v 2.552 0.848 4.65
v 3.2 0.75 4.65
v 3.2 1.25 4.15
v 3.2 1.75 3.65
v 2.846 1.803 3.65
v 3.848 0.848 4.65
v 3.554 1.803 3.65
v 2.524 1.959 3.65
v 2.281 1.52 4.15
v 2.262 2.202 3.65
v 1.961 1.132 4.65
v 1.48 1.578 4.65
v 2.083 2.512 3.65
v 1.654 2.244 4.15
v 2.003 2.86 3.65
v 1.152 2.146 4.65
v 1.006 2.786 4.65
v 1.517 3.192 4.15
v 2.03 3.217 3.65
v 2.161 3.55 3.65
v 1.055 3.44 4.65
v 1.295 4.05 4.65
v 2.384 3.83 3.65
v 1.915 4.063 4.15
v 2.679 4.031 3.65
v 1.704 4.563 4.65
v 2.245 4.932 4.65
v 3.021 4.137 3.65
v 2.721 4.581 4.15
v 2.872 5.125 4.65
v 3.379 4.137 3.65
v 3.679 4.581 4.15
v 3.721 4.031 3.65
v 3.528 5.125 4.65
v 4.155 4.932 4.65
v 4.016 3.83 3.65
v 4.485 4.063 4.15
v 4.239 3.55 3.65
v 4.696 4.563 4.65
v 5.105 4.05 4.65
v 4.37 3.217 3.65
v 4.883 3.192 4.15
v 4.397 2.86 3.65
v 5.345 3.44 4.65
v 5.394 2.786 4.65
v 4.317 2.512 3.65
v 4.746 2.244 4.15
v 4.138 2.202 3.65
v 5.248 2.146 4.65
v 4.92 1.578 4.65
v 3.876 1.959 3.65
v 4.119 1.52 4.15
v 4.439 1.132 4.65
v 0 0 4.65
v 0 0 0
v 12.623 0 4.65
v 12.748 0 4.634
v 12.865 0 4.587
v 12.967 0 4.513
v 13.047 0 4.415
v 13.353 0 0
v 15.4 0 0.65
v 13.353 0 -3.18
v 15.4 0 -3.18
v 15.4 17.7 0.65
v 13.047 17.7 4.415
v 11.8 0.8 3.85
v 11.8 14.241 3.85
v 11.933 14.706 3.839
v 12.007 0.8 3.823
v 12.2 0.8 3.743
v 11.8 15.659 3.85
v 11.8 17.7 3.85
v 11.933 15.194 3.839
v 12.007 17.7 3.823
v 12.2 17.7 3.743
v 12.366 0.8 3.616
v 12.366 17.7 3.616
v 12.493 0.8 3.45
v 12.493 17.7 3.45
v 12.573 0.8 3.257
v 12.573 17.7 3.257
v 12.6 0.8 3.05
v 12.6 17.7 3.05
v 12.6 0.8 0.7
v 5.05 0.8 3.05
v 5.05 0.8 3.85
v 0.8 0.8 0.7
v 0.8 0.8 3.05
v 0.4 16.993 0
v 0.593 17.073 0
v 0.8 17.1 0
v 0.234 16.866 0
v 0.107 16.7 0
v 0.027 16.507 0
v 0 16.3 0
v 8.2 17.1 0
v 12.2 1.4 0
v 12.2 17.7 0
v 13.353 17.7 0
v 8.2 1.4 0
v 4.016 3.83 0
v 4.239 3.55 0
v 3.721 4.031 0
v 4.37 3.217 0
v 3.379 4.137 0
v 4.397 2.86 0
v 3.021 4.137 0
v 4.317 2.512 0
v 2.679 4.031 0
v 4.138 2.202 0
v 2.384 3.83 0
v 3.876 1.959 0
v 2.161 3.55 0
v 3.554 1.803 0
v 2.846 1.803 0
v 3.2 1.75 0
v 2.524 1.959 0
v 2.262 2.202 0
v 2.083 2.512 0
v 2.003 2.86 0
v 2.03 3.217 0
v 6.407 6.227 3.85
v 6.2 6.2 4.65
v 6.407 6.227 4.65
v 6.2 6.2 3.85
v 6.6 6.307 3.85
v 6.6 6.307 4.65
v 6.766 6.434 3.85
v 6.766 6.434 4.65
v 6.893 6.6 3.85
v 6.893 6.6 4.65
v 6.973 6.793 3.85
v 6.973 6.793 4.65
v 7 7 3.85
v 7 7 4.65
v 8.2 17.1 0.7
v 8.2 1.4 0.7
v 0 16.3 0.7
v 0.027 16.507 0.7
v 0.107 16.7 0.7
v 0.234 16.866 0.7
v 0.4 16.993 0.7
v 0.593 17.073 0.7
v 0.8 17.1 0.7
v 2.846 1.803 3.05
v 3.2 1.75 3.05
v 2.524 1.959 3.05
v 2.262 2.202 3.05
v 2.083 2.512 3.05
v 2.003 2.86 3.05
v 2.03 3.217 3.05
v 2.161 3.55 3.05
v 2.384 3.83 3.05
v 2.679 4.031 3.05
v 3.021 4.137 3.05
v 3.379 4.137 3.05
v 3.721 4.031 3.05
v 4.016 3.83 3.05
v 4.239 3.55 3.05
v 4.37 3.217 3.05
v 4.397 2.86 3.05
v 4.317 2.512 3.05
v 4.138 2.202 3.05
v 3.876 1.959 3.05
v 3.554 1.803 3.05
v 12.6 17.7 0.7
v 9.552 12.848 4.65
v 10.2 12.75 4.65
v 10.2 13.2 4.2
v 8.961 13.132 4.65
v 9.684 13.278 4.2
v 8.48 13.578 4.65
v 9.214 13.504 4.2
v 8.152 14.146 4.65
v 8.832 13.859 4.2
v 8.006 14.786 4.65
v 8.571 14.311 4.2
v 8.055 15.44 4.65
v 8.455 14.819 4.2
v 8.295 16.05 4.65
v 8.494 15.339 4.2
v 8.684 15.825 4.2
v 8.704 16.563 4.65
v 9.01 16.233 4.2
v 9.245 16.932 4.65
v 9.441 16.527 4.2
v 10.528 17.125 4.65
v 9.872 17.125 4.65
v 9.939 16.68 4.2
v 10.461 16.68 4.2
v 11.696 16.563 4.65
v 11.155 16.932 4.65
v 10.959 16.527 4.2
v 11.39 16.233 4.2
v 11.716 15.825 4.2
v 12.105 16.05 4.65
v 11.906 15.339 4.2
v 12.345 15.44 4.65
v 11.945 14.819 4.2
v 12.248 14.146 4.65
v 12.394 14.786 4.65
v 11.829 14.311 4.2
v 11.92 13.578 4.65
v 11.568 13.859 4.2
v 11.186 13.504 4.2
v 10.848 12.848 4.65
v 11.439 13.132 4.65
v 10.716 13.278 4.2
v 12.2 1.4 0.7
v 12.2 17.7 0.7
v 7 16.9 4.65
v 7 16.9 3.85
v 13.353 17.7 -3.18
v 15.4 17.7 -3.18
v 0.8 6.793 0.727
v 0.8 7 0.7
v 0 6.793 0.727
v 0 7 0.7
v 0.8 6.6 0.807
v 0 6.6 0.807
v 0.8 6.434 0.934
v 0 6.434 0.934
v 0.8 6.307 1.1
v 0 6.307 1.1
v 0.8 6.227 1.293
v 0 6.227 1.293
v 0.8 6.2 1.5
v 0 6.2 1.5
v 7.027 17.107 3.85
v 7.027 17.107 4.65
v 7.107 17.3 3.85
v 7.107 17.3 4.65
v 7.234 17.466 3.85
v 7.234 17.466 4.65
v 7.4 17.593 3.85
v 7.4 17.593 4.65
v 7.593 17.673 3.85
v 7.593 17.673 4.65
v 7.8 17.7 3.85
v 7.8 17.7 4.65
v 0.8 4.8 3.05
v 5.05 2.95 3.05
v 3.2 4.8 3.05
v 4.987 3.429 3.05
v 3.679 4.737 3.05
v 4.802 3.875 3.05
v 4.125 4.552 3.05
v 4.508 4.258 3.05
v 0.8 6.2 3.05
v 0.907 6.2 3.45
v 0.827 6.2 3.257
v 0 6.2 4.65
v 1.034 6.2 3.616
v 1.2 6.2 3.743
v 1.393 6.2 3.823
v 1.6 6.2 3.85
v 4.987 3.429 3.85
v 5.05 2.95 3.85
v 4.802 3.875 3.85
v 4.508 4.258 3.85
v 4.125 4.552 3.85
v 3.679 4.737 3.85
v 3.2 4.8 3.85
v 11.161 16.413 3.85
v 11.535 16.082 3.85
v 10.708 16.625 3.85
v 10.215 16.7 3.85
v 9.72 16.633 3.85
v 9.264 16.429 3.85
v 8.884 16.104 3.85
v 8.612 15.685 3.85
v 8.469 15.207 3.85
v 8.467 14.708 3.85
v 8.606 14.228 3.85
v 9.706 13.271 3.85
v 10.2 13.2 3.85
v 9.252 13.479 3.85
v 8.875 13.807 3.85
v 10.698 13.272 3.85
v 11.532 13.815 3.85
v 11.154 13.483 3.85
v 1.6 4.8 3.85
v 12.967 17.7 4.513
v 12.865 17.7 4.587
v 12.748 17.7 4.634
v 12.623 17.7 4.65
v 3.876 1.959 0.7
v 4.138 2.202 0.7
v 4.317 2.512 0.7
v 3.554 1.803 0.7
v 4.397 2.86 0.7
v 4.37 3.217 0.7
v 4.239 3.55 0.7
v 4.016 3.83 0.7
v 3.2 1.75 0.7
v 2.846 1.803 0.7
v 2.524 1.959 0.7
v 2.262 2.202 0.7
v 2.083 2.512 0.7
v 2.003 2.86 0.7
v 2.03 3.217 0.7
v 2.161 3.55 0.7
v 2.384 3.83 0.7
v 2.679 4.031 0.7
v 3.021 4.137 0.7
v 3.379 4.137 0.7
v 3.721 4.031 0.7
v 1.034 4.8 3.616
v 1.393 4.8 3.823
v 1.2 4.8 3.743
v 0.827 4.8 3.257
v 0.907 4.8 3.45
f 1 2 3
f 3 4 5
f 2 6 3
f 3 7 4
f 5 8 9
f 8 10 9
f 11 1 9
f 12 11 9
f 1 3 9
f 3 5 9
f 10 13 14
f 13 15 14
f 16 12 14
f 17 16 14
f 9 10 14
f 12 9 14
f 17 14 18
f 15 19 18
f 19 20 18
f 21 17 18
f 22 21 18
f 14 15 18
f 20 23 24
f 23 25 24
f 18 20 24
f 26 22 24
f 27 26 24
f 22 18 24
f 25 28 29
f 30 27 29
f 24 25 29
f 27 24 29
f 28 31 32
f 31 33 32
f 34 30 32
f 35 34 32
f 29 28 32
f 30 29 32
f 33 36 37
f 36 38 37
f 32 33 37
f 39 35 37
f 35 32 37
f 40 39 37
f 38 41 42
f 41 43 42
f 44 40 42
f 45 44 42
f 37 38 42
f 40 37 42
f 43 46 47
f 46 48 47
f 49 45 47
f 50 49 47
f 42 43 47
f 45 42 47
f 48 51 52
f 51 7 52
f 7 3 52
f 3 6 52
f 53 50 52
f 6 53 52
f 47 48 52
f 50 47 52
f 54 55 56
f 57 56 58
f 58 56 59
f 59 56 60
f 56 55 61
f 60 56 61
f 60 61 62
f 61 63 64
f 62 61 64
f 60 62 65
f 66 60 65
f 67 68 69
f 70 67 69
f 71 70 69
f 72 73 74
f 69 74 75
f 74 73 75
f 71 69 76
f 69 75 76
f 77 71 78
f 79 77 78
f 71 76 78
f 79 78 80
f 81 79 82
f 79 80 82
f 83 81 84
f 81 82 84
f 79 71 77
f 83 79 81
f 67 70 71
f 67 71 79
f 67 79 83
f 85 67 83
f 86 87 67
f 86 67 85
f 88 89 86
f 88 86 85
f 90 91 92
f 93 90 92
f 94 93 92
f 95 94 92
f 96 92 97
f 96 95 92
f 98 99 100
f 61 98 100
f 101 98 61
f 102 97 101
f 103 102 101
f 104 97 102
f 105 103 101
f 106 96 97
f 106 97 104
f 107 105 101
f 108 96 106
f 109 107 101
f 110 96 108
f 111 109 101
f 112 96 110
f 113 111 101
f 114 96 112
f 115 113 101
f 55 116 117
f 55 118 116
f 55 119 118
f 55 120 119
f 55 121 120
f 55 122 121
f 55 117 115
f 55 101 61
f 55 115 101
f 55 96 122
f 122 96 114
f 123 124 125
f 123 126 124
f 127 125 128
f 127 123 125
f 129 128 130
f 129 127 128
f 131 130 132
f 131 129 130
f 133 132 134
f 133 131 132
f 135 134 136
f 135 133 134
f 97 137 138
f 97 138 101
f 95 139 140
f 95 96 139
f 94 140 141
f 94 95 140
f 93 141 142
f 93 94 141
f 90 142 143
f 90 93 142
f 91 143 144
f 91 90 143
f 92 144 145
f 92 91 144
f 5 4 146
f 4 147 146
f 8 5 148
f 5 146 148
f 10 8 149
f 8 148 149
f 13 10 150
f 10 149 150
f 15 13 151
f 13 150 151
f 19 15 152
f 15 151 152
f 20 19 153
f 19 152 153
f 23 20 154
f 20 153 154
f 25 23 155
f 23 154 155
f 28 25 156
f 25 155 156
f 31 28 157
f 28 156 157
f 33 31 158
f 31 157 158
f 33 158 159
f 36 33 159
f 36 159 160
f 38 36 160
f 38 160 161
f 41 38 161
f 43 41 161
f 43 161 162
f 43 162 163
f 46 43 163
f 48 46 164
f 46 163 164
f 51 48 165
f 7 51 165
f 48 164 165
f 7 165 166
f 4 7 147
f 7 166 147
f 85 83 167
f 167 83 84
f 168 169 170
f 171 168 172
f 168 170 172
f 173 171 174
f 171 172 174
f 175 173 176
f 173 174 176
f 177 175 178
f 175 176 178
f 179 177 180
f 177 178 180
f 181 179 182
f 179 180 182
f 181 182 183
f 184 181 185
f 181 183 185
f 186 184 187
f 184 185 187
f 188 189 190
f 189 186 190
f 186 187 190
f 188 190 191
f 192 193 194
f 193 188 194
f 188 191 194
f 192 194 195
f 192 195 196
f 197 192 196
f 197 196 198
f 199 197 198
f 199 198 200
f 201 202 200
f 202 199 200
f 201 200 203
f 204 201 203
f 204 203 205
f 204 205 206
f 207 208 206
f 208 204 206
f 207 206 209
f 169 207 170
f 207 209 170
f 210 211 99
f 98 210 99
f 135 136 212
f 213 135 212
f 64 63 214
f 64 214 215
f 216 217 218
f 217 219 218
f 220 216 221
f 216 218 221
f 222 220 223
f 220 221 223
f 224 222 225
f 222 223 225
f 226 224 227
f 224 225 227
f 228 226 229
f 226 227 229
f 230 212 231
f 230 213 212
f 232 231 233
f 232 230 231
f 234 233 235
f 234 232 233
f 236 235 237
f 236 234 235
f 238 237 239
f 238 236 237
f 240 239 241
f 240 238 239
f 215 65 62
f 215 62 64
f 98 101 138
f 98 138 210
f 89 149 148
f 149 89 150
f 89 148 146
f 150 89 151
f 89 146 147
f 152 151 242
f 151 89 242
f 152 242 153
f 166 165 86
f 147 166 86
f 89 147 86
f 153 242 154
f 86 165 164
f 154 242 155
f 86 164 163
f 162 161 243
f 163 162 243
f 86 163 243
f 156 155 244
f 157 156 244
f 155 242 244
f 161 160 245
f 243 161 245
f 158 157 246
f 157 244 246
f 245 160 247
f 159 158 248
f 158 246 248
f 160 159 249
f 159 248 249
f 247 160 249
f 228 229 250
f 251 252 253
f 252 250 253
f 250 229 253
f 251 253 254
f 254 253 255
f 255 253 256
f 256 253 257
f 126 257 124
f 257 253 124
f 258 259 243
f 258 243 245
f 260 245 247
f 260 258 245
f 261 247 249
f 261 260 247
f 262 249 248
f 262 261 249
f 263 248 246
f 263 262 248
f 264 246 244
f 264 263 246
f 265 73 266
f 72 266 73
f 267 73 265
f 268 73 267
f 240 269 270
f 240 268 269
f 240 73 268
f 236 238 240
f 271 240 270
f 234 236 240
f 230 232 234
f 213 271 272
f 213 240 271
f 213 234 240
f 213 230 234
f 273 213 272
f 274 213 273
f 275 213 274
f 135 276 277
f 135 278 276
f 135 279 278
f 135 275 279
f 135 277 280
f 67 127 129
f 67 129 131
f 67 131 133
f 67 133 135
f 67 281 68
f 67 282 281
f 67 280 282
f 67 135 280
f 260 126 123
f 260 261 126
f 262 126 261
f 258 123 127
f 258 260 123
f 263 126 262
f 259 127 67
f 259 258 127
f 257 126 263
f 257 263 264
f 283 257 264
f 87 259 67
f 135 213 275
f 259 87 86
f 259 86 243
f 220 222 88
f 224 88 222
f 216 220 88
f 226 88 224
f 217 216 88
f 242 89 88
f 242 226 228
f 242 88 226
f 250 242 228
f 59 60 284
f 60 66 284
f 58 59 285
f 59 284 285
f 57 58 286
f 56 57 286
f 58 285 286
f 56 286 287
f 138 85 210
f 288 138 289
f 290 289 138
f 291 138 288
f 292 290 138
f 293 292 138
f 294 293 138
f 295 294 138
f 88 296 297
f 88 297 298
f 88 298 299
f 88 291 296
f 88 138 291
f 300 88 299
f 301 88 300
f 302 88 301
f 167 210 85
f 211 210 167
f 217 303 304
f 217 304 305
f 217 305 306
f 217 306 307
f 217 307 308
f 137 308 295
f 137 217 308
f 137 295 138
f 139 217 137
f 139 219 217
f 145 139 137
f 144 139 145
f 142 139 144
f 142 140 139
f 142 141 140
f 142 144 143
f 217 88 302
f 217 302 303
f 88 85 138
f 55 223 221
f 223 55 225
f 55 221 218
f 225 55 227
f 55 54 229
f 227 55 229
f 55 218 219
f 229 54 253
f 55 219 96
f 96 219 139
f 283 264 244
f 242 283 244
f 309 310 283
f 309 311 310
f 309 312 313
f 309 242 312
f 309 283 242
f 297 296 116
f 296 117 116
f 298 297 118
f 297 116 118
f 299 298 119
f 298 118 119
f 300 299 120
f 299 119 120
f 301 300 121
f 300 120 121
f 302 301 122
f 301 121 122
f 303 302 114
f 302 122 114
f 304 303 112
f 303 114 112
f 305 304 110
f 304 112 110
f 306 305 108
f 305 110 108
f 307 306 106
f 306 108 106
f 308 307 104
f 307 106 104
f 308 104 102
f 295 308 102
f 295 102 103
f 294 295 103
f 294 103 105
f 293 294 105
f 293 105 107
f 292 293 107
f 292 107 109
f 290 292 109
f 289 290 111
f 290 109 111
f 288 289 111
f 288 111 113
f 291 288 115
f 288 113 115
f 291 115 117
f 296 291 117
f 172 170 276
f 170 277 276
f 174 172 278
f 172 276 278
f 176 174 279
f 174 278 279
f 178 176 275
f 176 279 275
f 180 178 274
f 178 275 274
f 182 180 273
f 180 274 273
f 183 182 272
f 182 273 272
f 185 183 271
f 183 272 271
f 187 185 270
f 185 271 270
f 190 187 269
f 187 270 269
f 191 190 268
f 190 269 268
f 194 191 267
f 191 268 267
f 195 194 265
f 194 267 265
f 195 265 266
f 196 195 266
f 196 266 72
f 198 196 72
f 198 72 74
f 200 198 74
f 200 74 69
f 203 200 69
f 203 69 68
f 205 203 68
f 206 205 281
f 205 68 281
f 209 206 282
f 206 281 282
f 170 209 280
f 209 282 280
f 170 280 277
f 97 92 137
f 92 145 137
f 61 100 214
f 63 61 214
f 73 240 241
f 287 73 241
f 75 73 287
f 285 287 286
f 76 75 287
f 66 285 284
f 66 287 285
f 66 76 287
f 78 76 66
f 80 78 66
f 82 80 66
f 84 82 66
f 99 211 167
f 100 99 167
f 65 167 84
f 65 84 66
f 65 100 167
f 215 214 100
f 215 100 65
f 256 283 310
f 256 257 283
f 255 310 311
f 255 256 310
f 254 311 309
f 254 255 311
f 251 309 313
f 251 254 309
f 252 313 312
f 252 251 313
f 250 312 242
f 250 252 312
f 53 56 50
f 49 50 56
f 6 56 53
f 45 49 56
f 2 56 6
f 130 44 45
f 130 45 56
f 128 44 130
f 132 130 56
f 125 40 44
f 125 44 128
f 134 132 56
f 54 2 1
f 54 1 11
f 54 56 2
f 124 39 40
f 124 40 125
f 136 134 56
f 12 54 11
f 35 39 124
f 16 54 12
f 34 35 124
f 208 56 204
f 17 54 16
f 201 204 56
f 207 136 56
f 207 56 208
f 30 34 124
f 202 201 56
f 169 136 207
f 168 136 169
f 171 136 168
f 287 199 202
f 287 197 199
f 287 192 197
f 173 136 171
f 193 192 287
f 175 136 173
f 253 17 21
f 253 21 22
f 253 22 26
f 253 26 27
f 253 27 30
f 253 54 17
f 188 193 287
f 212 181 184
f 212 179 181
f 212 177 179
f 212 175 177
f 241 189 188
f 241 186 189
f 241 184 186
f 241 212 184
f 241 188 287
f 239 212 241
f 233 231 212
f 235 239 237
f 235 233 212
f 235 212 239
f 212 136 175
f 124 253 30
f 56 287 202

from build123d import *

# Parameters (mm, degrees)
BOSS_EXTRUDE1_DEPTH                             = 15.4
CUT_EXTRUDE2_REACH                              = 25.918
SKETCH3_W                                       = 7
SKETCH3_H                                       = 11.5
BOSS_EXTRUDE3_REACH                             = 25.918
SKETCH4_W                                       = 0.8
SKETCH4_H                                       = 6.2
SKETCH4_W_2                                     = 2.8
SKETCH4_H_2                                     = 17.7
SKETCH10_W                                      = 4
SKETCH10_H                                      = 0.7
CUT_EXTRUDE4_DEPTH                              = 16.3
BOSS_EXTRUDE4_DEPTH                             = 0.8
CSK_FOR_M2_FLAT_HEAD_MACHINE_SCREW3_D           = 2.4
CSK_FOR_M2_FLAT_HEAD_MACHINE_SCREW3_CSINK_D     = 4.4
CSK_FOR_M2_FLAT_HEAD_MACHINE_SCREW3_CSINK_ANGLE = 90
MOVE_FACE1_BY                                   = 0.6
FILLET3_R                                       = 0.8
CHAMFER1_SIZE                                   = 2.5
CHAMFER1_SIZE2                                  = 4
SKETCH12_W                                      = 2.0475
SKETCH12_H                                      = 3.18
BOSS_EXTRUDE5_DEPTH                             = 17.7
FILLET5_R                                       = 0.5
SKETCH11_R                                      = 1.75
CUT_EXTRUDE5_DEPTH                              = 25.492262043
CUT_EXTRUDE5_DIRECTION_2_REACH                  = 26.492


with BuildPart() as part:
    # Sketch2 → Boss-Extrude1 (new body)
    with BuildSketch(Plane(origin=(0, 0, 0), x_dir=(0, 0, -1), z_dir=(1, 0, 0))):
        Polygon((0, 0), (-4.65, 0), (-4.65, 17.7), (-3.85, 17.7), (-3.85, 0.8), (-0.7, 0.8), (-0.7, 17.7), (0, 17.7), align=None)
    extrude(amount=BOSS_EXTRUDE1_DEPTH)

    # Sketch3 → Cut-Extrude2 (cut, up to next)
    with BuildSketch(Plane.XY.offset(4.65), mode=Mode.PRIVATE) as cut_extrude2_sk1:
        with Locations((3.5, 11.95)):
            Rectangle(SKETCH3_W, SKETCH3_H)
    cut_extrude2_tool1 = extrude(cut_extrude2_sk1.sketch, amount=-CUT_EXTRUDE2_REACH, mode=Mode.PRIVATE) & part.part
    add(cut_extrude2_tool1.solids().sort_by_distance((3.5, 11.95, 4.65))[0], mode=Mode.SUBTRACT)

    # Sketch4 → Boss-Extrude3 (add, up to next)
    with BuildSketch(Plane.XY.offset(4.65), mode=Mode.PRIVATE) as boss_extrude3_sk1:
        with Locations((0.4, 3.1)):
            Rectangle(SKETCH4_W, SKETCH4_H)
    boss_extrude3_tool1 = extrude(boss_extrude3_sk1.sketch, amount=-BOSS_EXTRUDE3_REACH, mode=Mode.PRIVATE) - part.part
    # Sketch4 → Boss-Extrude3 (add, up to next)
    with BuildSketch(Plane.XY.offset(4.65), mode=Mode.PRIVATE) as boss_extrude3_sk2:
        with Locations((14, 8.85)):
            Rectangle(SKETCH4_W_2, SKETCH4_H_2)
    boss_extrude3_tool2 = extrude(boss_extrude3_sk2.sketch, amount=-BOSS_EXTRUDE3_REACH, mode=Mode.PRIVATE) - part.part
    add(boss_extrude3_tool1.solids().sort_by_distance((0.4, 3.1, 4.65))[0])
    add(boss_extrude3_tool2.solids().sort_by_distance((14, 8.85, 4.65))[0])

    # Sketch10 → Cut-Extrude4 (cut)
    with BuildSketch(Plane(origin=(0, 17.7, 0), x_dir=(1, 0, 0), z_dir=(0, 1, 0))):
        with Locations((10.2, -0.35)):
            Rectangle(SKETCH10_W, SKETCH10_H)
    extrude(amount=-CUT_EXTRUDE4_DEPTH, mode=Mode.SUBTRACT)

    # Sketch6 → Boss-Extrude4 (add)
    with BuildSketch(Plane(origin=(0, 0, 3.85), x_dir=(-1, 0, 0), z_dir=(0, 0, -1))):
        with BuildLine():
            Line((-0.8, 0.8), (-5.05, 0.8))
            Line((-5.05, 0.8), (-5.05, 2.95))
            ThreePointArc((-5.05, 2.95), (-4.508147545, 4.258147545), (-3.2, 4.8))
            Line((-3.2, 4.8), (-0.8, 4.8))
            Line((-0.8, 4.8), (-0.8, 0.8))
        make_face()
    extrude(amount=BOSS_EXTRUDE4_DEPTH)

    # CSK for M2 Flat Head Machine Screw3 (through all)
    with Locations(Plane(origin=(10.2, 14.95, 4.65), x_dir=(0, 1, 0), z_dir=(0, 0, 1))):
        with Locations((0, 0), (-12, 7)):
            CounterSinkHole(CSK_FOR_M2_FLAT_HEAD_MACHINE_SCREW3_D / 2, CSK_FOR_M2_FLAT_HEAD_MACHINE_SCREW3_CSINK_D / 2, counter_sink_angle=CSK_FOR_M2_FLAT_HEAD_MACHINE_SCREW3_CSINK_ANGLE)

    # Move Face1: a face moved inward by 0.6
    extrude(part.faces().sort_by_distance((4.1, 17.7, 0.35))[0], amount=MOVE_FACE1_BY, dir=(0, -1, 0), mode=Mode.SUBTRACT)

    # Fillet3
    fillet3_edges = [part.edges().sort_by_distance(p)[0] for p in [
        (0.8, 5.5, 3.85),
        (12.6, 9.25, 3.85),
        (0.4, 6.2, 0.7),
        (7, 6.2, 4.25),
        (7, 17.7, 4.25),
        (0, 17.1, 0.35),
    ]]
    fillet(fillet3_edges, radius=FILLET3_R)

    # Chamfer1
    chamfer1_edges = [part.edges().sort_by_distance(p)[0] for p in [
        (15.4, 8.85, 4.65),
    ]]
    chamfer1_side = [part.faces().sort_by_distance(p)[0] for p in [
        (9.979105197, 7.278141181, 4.65),
    ]]
    chamfer(chamfer1_edges, length=CHAMFER1_SIZE, length2=CHAMFER1_SIZE2, reference=chamfer1_side[0])

    # Sketch12 → Boss-Extrude5 (add)
    with BuildSketch(Plane(origin=(0, 17.7, 0), x_dir=(1, 0, 0), z_dir=(0, 1, 0))):
        with Locations((14.37625, 1.59)):
            Rectangle(SKETCH12_W, SKETCH12_H)
    extrude(amount=-BOSS_EXTRUDE5_DEPTH)

    # Fillet5
    fillet5_edges = [part.edges().sort_by_distance(p)[0] for p in [
        (12.9, 8.85, 4.65),
    ]]
    fillet(fillet5_edges, radius=FILLET5_R)

    # Sketch11 → Cut-Extrude5 (cut)
    with BuildSketch(Plane(origin=(0, 0, 3.85), x_dir=(-1, 0, 0), z_dir=(0, 0, -1))):
        with Locations(Location((-10.2, 14.95, 0), (0, 0, 270))):
            Circle(SKETCH11_R)
    extrude(amount=-CUT_EXTRUDE5_DEPTH, mode=Mode.SUBTRACT)

    # Sketch11 → Cut-Extrude5 direction 2 (cut, up to next)
    with BuildSketch(Plane(origin=(0, 0, 3.85), x_dir=(-1, 0, 0), z_dir=(0, 0, -1)), mode=Mode.PRIVATE) as cut_extrude5_direction_2_sk1:
        with Locations(Location((-10.2, 14.95, 0), (0, 0, 270))):
            Circle(SKETCH11_R)
    cut_extrude5_direction_2_tool1 = extrude(cut_extrude5_direction_2_sk1.sketch, amount=CUT_EXTRUDE5_DIRECTION_2_REACH, mode=Mode.PRIVATE) & part.part
    add(cut_extrude5_direction_2_tool1.solids().sort_by_distance((10.2, 14.95, 3.85))[0], mode=Mode.SUBTRACT)


solid = part.part
